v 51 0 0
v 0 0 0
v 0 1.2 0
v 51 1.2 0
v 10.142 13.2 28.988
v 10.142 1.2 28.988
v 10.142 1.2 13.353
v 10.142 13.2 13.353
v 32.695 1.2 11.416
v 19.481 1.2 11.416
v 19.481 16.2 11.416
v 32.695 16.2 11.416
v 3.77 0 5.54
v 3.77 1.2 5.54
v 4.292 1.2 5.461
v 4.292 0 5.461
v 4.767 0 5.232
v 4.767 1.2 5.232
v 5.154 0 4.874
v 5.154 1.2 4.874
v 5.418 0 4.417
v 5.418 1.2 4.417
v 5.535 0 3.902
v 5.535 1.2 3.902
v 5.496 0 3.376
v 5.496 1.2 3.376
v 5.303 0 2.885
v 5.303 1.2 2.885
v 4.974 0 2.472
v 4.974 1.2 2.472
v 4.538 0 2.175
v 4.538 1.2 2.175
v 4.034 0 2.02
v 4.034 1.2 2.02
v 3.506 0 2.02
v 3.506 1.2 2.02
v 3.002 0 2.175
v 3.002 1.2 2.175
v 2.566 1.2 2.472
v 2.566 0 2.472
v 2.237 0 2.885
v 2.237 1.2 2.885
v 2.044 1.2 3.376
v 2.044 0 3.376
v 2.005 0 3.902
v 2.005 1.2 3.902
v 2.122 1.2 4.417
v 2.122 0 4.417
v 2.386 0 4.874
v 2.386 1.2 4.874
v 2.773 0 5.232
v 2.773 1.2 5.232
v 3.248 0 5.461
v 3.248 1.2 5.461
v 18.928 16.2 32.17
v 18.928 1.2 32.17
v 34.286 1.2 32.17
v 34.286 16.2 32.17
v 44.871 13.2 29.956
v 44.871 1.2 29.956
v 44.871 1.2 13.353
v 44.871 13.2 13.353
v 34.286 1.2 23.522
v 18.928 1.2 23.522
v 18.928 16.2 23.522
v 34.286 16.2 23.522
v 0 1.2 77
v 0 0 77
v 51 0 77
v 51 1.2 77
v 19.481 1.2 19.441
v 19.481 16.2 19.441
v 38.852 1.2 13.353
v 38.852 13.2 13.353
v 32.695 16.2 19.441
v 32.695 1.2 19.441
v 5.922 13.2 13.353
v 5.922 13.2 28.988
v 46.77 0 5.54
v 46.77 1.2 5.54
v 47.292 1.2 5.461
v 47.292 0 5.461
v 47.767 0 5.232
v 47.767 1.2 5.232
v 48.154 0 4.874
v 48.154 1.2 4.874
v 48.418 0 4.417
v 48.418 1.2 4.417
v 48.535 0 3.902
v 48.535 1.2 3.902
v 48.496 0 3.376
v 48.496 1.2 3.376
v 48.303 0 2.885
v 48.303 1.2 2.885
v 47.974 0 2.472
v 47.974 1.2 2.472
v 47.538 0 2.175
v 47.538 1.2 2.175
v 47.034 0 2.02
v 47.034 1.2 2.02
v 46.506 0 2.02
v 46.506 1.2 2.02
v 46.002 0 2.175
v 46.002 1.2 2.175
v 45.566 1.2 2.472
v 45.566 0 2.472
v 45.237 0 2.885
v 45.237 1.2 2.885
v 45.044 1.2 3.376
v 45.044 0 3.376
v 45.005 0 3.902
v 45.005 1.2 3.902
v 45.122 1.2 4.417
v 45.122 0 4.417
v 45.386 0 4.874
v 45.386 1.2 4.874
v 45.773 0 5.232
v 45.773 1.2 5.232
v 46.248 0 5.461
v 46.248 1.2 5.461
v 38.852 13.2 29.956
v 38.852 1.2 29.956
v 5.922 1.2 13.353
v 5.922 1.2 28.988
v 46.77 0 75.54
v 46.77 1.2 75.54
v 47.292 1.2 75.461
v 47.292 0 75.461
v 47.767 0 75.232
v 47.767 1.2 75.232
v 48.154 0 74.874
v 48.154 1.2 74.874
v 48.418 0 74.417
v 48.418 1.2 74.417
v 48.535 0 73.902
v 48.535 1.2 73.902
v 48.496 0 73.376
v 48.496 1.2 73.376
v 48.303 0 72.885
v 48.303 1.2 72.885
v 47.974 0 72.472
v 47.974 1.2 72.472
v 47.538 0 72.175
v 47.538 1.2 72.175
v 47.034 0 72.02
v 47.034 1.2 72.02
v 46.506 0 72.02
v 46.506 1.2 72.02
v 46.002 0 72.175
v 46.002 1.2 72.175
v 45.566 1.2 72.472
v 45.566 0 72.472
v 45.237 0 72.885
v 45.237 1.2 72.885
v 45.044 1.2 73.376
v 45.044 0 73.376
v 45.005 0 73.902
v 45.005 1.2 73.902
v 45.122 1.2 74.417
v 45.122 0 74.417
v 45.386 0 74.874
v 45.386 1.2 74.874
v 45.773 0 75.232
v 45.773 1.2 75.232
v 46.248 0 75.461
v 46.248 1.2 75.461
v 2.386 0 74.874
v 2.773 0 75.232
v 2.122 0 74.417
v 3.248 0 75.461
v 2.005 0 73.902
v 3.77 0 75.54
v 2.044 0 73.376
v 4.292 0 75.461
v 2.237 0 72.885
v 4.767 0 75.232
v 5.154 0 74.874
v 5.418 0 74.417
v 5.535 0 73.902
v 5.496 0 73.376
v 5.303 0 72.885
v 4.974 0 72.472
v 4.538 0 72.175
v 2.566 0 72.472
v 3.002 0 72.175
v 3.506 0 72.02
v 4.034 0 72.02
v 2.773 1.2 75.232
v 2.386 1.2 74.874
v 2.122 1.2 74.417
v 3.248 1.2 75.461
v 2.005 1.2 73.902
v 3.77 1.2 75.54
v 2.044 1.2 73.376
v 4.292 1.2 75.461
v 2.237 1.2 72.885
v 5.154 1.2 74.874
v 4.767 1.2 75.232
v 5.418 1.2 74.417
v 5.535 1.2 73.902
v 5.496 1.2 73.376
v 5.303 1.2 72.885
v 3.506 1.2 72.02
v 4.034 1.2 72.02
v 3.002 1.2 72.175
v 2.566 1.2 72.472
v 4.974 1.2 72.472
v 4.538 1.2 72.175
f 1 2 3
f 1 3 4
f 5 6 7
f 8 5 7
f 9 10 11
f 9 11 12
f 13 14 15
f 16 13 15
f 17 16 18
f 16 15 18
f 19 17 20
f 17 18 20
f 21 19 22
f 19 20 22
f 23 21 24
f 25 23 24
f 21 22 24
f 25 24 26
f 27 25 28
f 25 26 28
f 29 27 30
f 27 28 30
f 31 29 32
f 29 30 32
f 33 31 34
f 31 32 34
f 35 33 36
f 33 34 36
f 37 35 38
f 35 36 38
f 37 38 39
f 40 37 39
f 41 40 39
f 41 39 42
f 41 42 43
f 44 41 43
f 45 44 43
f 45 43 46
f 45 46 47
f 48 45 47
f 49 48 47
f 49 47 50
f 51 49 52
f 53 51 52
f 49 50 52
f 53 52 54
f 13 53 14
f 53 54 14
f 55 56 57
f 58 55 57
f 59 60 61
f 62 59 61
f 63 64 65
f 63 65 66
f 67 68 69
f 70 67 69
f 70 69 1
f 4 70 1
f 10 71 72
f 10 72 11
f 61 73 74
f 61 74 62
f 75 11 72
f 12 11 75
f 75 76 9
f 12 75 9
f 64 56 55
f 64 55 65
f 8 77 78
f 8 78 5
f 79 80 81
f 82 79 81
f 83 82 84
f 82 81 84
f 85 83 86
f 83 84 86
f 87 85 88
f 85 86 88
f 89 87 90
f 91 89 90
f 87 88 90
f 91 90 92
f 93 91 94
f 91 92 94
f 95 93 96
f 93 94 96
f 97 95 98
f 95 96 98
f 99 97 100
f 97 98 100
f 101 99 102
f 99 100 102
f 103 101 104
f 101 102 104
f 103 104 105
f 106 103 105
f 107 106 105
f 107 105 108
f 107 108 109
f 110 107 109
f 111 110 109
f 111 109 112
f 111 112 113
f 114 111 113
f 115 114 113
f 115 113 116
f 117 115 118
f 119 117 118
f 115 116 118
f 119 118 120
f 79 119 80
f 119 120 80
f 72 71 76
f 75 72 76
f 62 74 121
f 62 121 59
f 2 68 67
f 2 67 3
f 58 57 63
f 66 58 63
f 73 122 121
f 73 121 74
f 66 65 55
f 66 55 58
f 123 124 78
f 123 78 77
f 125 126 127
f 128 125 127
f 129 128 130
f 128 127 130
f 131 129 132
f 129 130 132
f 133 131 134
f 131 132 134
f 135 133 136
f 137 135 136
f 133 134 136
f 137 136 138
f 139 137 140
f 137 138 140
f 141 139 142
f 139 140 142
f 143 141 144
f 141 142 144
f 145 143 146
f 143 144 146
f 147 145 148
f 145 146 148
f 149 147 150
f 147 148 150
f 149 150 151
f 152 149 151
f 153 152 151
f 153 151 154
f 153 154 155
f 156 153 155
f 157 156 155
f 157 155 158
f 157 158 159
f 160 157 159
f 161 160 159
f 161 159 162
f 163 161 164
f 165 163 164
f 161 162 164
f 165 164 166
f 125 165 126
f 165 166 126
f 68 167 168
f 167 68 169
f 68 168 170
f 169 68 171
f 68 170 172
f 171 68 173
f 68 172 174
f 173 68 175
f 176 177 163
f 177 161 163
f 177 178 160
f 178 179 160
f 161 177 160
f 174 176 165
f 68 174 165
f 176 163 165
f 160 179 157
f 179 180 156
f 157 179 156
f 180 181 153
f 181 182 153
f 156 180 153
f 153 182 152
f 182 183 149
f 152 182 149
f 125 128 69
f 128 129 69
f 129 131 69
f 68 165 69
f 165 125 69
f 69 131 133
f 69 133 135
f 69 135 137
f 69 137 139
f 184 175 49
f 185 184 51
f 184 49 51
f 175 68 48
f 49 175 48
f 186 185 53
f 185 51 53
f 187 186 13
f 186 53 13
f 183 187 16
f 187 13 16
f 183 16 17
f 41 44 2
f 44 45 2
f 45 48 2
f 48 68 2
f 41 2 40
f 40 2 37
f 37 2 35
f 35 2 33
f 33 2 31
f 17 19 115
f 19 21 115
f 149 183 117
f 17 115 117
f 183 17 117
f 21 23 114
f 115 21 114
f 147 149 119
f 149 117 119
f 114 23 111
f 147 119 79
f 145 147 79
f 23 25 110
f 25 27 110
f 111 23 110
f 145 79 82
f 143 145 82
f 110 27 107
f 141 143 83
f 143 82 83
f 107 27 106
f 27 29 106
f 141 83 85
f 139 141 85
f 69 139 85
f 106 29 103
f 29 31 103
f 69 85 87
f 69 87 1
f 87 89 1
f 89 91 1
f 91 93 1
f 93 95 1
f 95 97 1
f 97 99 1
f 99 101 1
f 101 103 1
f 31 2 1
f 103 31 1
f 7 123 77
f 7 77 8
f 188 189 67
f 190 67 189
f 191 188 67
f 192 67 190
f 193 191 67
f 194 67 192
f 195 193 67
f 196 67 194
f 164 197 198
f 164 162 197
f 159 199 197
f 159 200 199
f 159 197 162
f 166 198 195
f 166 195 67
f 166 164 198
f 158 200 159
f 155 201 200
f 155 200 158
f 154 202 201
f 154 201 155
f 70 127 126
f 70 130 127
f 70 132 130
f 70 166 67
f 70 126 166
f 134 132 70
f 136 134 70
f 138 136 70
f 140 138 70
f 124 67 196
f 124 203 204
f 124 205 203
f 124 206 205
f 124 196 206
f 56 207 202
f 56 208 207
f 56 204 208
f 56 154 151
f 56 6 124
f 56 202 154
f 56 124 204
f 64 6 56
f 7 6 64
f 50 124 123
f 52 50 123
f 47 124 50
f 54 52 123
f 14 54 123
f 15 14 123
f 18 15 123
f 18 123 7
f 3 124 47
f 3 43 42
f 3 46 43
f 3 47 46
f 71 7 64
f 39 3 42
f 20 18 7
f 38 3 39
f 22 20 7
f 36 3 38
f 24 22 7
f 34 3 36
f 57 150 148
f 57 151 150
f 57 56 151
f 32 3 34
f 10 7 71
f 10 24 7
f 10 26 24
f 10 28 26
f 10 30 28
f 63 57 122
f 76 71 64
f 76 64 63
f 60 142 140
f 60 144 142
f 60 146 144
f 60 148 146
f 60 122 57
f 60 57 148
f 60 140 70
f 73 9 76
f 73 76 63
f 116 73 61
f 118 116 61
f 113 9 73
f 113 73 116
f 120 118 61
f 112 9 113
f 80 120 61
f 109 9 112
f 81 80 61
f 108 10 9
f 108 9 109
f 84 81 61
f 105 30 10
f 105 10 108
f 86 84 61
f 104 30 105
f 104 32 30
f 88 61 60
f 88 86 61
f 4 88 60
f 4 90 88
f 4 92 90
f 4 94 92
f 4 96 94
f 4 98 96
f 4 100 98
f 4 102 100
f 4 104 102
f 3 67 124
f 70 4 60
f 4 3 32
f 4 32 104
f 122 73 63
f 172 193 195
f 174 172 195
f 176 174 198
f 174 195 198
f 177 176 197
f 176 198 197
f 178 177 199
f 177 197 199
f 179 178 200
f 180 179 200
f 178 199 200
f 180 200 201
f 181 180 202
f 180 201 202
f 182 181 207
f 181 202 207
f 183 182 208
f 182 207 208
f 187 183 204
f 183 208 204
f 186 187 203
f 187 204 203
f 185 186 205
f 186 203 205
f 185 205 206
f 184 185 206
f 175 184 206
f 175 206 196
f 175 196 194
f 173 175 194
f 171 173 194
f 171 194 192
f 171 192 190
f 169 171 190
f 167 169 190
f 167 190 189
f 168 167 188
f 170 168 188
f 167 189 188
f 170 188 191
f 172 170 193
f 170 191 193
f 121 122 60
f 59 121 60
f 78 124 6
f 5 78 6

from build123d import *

# Parameters (mm, degrees)
SKETCH1_W           = 51
SKETCH1_H           = 77
BOSS_EXTRUDE1_DEPTH = 1.2
SKETCH2_R           = 1.77
CUT_EXTRUDE1_DEPTH  = 1.2
SKETCH3_W           = 13.21357214
SKETCH3_H           = 8.024996692
SKETCH3_W_2         = 15.358183325
SKETCH3_H_2         = 8.647625746
BOSS_EXTRUDE2_DEPTH = 15
SKETCH4_W           = 4.220041364
SKETCH4_H           = 15.634907348
SKETCH4_W_2         = 6.018747519
SKETCH4_H_2         = 16.603441432
BOSS_EXTRUDE3_DEPTH = 12


with BuildPart() as part:
    # Sketch1 → Boss-Extrude1 (new body)
    with BuildSketch(Plane(origin=(0, 0, 0), x_dir=(1, 0, 0), z_dir=(0, 1, 0))):
        with Locations((25.5, -38.5)):
            Rectangle(SKETCH1_W, SKETCH1_H)
    extrude(amount=BOSS_EXTRUDE1_DEPTH)

    # Sketch2 → Cut-Extrude1 (cut)
    with BuildSketch(Plane(origin=(0, 1.2, 0), x_dir=(1, 0, 0), z_dir=(0, 1, 0))):
        with Locations(Location((3.77, -3.77, 0), (0, 0, 270))):
            Circle(SKETCH2_R)
        with Locations(Location((46.77, -3.77, 0), (0, 0, 270))):
            Circle(SKETCH2_R)
        with Locations(Location((46.77, -73.77, 0), (0, 0, 270))):
            Circle(SKETCH2_R)
        with Locations(Location((3.77, -73.77, 0), (0, 0, 270))):
            Circle(SKETCH2_R)
    extrude(amount=-CUT_EXTRUDE1_DEPTH, mode=Mode.SUBTRACT)

    # Sketch3 → Boss-Extrude2 (add)
    with BuildSketch(Plane(origin=(0, 1.2, 0), x_dir=(1, 0, 0), z_dir=(0, 1, 0))):
        with Locations((26.088038551, -15.42813451)):
            Rectangle(SKETCH3_W, SKETCH3_H)
        with Locations((26.606896096, -27.846125081)):
            Rectangle(SKETCH3_W_2, SKETCH3_H_2)
    extrude(amount=BOSS_EXTRUDE2_DEPTH)

    # Sketch4 → Boss-Extrude3 (add)
    with BuildSketch(Plane(origin=(0, 1.2, 0), x_dir=(1, 0, 0), z_dir=(0, 1, 0))):
        with Locations((8.031795993, -21.170158005)):
            Rectangle(SKETCH4_W, SKETCH4_H)
        with Locations((41.861307912, -21.654425047)):
            Rectangle(SKETCH4_W_2, SKETCH4_H_2)
    extrude(amount=BOSS_EXTRUDE3_DEPTH)


solid = part.part
